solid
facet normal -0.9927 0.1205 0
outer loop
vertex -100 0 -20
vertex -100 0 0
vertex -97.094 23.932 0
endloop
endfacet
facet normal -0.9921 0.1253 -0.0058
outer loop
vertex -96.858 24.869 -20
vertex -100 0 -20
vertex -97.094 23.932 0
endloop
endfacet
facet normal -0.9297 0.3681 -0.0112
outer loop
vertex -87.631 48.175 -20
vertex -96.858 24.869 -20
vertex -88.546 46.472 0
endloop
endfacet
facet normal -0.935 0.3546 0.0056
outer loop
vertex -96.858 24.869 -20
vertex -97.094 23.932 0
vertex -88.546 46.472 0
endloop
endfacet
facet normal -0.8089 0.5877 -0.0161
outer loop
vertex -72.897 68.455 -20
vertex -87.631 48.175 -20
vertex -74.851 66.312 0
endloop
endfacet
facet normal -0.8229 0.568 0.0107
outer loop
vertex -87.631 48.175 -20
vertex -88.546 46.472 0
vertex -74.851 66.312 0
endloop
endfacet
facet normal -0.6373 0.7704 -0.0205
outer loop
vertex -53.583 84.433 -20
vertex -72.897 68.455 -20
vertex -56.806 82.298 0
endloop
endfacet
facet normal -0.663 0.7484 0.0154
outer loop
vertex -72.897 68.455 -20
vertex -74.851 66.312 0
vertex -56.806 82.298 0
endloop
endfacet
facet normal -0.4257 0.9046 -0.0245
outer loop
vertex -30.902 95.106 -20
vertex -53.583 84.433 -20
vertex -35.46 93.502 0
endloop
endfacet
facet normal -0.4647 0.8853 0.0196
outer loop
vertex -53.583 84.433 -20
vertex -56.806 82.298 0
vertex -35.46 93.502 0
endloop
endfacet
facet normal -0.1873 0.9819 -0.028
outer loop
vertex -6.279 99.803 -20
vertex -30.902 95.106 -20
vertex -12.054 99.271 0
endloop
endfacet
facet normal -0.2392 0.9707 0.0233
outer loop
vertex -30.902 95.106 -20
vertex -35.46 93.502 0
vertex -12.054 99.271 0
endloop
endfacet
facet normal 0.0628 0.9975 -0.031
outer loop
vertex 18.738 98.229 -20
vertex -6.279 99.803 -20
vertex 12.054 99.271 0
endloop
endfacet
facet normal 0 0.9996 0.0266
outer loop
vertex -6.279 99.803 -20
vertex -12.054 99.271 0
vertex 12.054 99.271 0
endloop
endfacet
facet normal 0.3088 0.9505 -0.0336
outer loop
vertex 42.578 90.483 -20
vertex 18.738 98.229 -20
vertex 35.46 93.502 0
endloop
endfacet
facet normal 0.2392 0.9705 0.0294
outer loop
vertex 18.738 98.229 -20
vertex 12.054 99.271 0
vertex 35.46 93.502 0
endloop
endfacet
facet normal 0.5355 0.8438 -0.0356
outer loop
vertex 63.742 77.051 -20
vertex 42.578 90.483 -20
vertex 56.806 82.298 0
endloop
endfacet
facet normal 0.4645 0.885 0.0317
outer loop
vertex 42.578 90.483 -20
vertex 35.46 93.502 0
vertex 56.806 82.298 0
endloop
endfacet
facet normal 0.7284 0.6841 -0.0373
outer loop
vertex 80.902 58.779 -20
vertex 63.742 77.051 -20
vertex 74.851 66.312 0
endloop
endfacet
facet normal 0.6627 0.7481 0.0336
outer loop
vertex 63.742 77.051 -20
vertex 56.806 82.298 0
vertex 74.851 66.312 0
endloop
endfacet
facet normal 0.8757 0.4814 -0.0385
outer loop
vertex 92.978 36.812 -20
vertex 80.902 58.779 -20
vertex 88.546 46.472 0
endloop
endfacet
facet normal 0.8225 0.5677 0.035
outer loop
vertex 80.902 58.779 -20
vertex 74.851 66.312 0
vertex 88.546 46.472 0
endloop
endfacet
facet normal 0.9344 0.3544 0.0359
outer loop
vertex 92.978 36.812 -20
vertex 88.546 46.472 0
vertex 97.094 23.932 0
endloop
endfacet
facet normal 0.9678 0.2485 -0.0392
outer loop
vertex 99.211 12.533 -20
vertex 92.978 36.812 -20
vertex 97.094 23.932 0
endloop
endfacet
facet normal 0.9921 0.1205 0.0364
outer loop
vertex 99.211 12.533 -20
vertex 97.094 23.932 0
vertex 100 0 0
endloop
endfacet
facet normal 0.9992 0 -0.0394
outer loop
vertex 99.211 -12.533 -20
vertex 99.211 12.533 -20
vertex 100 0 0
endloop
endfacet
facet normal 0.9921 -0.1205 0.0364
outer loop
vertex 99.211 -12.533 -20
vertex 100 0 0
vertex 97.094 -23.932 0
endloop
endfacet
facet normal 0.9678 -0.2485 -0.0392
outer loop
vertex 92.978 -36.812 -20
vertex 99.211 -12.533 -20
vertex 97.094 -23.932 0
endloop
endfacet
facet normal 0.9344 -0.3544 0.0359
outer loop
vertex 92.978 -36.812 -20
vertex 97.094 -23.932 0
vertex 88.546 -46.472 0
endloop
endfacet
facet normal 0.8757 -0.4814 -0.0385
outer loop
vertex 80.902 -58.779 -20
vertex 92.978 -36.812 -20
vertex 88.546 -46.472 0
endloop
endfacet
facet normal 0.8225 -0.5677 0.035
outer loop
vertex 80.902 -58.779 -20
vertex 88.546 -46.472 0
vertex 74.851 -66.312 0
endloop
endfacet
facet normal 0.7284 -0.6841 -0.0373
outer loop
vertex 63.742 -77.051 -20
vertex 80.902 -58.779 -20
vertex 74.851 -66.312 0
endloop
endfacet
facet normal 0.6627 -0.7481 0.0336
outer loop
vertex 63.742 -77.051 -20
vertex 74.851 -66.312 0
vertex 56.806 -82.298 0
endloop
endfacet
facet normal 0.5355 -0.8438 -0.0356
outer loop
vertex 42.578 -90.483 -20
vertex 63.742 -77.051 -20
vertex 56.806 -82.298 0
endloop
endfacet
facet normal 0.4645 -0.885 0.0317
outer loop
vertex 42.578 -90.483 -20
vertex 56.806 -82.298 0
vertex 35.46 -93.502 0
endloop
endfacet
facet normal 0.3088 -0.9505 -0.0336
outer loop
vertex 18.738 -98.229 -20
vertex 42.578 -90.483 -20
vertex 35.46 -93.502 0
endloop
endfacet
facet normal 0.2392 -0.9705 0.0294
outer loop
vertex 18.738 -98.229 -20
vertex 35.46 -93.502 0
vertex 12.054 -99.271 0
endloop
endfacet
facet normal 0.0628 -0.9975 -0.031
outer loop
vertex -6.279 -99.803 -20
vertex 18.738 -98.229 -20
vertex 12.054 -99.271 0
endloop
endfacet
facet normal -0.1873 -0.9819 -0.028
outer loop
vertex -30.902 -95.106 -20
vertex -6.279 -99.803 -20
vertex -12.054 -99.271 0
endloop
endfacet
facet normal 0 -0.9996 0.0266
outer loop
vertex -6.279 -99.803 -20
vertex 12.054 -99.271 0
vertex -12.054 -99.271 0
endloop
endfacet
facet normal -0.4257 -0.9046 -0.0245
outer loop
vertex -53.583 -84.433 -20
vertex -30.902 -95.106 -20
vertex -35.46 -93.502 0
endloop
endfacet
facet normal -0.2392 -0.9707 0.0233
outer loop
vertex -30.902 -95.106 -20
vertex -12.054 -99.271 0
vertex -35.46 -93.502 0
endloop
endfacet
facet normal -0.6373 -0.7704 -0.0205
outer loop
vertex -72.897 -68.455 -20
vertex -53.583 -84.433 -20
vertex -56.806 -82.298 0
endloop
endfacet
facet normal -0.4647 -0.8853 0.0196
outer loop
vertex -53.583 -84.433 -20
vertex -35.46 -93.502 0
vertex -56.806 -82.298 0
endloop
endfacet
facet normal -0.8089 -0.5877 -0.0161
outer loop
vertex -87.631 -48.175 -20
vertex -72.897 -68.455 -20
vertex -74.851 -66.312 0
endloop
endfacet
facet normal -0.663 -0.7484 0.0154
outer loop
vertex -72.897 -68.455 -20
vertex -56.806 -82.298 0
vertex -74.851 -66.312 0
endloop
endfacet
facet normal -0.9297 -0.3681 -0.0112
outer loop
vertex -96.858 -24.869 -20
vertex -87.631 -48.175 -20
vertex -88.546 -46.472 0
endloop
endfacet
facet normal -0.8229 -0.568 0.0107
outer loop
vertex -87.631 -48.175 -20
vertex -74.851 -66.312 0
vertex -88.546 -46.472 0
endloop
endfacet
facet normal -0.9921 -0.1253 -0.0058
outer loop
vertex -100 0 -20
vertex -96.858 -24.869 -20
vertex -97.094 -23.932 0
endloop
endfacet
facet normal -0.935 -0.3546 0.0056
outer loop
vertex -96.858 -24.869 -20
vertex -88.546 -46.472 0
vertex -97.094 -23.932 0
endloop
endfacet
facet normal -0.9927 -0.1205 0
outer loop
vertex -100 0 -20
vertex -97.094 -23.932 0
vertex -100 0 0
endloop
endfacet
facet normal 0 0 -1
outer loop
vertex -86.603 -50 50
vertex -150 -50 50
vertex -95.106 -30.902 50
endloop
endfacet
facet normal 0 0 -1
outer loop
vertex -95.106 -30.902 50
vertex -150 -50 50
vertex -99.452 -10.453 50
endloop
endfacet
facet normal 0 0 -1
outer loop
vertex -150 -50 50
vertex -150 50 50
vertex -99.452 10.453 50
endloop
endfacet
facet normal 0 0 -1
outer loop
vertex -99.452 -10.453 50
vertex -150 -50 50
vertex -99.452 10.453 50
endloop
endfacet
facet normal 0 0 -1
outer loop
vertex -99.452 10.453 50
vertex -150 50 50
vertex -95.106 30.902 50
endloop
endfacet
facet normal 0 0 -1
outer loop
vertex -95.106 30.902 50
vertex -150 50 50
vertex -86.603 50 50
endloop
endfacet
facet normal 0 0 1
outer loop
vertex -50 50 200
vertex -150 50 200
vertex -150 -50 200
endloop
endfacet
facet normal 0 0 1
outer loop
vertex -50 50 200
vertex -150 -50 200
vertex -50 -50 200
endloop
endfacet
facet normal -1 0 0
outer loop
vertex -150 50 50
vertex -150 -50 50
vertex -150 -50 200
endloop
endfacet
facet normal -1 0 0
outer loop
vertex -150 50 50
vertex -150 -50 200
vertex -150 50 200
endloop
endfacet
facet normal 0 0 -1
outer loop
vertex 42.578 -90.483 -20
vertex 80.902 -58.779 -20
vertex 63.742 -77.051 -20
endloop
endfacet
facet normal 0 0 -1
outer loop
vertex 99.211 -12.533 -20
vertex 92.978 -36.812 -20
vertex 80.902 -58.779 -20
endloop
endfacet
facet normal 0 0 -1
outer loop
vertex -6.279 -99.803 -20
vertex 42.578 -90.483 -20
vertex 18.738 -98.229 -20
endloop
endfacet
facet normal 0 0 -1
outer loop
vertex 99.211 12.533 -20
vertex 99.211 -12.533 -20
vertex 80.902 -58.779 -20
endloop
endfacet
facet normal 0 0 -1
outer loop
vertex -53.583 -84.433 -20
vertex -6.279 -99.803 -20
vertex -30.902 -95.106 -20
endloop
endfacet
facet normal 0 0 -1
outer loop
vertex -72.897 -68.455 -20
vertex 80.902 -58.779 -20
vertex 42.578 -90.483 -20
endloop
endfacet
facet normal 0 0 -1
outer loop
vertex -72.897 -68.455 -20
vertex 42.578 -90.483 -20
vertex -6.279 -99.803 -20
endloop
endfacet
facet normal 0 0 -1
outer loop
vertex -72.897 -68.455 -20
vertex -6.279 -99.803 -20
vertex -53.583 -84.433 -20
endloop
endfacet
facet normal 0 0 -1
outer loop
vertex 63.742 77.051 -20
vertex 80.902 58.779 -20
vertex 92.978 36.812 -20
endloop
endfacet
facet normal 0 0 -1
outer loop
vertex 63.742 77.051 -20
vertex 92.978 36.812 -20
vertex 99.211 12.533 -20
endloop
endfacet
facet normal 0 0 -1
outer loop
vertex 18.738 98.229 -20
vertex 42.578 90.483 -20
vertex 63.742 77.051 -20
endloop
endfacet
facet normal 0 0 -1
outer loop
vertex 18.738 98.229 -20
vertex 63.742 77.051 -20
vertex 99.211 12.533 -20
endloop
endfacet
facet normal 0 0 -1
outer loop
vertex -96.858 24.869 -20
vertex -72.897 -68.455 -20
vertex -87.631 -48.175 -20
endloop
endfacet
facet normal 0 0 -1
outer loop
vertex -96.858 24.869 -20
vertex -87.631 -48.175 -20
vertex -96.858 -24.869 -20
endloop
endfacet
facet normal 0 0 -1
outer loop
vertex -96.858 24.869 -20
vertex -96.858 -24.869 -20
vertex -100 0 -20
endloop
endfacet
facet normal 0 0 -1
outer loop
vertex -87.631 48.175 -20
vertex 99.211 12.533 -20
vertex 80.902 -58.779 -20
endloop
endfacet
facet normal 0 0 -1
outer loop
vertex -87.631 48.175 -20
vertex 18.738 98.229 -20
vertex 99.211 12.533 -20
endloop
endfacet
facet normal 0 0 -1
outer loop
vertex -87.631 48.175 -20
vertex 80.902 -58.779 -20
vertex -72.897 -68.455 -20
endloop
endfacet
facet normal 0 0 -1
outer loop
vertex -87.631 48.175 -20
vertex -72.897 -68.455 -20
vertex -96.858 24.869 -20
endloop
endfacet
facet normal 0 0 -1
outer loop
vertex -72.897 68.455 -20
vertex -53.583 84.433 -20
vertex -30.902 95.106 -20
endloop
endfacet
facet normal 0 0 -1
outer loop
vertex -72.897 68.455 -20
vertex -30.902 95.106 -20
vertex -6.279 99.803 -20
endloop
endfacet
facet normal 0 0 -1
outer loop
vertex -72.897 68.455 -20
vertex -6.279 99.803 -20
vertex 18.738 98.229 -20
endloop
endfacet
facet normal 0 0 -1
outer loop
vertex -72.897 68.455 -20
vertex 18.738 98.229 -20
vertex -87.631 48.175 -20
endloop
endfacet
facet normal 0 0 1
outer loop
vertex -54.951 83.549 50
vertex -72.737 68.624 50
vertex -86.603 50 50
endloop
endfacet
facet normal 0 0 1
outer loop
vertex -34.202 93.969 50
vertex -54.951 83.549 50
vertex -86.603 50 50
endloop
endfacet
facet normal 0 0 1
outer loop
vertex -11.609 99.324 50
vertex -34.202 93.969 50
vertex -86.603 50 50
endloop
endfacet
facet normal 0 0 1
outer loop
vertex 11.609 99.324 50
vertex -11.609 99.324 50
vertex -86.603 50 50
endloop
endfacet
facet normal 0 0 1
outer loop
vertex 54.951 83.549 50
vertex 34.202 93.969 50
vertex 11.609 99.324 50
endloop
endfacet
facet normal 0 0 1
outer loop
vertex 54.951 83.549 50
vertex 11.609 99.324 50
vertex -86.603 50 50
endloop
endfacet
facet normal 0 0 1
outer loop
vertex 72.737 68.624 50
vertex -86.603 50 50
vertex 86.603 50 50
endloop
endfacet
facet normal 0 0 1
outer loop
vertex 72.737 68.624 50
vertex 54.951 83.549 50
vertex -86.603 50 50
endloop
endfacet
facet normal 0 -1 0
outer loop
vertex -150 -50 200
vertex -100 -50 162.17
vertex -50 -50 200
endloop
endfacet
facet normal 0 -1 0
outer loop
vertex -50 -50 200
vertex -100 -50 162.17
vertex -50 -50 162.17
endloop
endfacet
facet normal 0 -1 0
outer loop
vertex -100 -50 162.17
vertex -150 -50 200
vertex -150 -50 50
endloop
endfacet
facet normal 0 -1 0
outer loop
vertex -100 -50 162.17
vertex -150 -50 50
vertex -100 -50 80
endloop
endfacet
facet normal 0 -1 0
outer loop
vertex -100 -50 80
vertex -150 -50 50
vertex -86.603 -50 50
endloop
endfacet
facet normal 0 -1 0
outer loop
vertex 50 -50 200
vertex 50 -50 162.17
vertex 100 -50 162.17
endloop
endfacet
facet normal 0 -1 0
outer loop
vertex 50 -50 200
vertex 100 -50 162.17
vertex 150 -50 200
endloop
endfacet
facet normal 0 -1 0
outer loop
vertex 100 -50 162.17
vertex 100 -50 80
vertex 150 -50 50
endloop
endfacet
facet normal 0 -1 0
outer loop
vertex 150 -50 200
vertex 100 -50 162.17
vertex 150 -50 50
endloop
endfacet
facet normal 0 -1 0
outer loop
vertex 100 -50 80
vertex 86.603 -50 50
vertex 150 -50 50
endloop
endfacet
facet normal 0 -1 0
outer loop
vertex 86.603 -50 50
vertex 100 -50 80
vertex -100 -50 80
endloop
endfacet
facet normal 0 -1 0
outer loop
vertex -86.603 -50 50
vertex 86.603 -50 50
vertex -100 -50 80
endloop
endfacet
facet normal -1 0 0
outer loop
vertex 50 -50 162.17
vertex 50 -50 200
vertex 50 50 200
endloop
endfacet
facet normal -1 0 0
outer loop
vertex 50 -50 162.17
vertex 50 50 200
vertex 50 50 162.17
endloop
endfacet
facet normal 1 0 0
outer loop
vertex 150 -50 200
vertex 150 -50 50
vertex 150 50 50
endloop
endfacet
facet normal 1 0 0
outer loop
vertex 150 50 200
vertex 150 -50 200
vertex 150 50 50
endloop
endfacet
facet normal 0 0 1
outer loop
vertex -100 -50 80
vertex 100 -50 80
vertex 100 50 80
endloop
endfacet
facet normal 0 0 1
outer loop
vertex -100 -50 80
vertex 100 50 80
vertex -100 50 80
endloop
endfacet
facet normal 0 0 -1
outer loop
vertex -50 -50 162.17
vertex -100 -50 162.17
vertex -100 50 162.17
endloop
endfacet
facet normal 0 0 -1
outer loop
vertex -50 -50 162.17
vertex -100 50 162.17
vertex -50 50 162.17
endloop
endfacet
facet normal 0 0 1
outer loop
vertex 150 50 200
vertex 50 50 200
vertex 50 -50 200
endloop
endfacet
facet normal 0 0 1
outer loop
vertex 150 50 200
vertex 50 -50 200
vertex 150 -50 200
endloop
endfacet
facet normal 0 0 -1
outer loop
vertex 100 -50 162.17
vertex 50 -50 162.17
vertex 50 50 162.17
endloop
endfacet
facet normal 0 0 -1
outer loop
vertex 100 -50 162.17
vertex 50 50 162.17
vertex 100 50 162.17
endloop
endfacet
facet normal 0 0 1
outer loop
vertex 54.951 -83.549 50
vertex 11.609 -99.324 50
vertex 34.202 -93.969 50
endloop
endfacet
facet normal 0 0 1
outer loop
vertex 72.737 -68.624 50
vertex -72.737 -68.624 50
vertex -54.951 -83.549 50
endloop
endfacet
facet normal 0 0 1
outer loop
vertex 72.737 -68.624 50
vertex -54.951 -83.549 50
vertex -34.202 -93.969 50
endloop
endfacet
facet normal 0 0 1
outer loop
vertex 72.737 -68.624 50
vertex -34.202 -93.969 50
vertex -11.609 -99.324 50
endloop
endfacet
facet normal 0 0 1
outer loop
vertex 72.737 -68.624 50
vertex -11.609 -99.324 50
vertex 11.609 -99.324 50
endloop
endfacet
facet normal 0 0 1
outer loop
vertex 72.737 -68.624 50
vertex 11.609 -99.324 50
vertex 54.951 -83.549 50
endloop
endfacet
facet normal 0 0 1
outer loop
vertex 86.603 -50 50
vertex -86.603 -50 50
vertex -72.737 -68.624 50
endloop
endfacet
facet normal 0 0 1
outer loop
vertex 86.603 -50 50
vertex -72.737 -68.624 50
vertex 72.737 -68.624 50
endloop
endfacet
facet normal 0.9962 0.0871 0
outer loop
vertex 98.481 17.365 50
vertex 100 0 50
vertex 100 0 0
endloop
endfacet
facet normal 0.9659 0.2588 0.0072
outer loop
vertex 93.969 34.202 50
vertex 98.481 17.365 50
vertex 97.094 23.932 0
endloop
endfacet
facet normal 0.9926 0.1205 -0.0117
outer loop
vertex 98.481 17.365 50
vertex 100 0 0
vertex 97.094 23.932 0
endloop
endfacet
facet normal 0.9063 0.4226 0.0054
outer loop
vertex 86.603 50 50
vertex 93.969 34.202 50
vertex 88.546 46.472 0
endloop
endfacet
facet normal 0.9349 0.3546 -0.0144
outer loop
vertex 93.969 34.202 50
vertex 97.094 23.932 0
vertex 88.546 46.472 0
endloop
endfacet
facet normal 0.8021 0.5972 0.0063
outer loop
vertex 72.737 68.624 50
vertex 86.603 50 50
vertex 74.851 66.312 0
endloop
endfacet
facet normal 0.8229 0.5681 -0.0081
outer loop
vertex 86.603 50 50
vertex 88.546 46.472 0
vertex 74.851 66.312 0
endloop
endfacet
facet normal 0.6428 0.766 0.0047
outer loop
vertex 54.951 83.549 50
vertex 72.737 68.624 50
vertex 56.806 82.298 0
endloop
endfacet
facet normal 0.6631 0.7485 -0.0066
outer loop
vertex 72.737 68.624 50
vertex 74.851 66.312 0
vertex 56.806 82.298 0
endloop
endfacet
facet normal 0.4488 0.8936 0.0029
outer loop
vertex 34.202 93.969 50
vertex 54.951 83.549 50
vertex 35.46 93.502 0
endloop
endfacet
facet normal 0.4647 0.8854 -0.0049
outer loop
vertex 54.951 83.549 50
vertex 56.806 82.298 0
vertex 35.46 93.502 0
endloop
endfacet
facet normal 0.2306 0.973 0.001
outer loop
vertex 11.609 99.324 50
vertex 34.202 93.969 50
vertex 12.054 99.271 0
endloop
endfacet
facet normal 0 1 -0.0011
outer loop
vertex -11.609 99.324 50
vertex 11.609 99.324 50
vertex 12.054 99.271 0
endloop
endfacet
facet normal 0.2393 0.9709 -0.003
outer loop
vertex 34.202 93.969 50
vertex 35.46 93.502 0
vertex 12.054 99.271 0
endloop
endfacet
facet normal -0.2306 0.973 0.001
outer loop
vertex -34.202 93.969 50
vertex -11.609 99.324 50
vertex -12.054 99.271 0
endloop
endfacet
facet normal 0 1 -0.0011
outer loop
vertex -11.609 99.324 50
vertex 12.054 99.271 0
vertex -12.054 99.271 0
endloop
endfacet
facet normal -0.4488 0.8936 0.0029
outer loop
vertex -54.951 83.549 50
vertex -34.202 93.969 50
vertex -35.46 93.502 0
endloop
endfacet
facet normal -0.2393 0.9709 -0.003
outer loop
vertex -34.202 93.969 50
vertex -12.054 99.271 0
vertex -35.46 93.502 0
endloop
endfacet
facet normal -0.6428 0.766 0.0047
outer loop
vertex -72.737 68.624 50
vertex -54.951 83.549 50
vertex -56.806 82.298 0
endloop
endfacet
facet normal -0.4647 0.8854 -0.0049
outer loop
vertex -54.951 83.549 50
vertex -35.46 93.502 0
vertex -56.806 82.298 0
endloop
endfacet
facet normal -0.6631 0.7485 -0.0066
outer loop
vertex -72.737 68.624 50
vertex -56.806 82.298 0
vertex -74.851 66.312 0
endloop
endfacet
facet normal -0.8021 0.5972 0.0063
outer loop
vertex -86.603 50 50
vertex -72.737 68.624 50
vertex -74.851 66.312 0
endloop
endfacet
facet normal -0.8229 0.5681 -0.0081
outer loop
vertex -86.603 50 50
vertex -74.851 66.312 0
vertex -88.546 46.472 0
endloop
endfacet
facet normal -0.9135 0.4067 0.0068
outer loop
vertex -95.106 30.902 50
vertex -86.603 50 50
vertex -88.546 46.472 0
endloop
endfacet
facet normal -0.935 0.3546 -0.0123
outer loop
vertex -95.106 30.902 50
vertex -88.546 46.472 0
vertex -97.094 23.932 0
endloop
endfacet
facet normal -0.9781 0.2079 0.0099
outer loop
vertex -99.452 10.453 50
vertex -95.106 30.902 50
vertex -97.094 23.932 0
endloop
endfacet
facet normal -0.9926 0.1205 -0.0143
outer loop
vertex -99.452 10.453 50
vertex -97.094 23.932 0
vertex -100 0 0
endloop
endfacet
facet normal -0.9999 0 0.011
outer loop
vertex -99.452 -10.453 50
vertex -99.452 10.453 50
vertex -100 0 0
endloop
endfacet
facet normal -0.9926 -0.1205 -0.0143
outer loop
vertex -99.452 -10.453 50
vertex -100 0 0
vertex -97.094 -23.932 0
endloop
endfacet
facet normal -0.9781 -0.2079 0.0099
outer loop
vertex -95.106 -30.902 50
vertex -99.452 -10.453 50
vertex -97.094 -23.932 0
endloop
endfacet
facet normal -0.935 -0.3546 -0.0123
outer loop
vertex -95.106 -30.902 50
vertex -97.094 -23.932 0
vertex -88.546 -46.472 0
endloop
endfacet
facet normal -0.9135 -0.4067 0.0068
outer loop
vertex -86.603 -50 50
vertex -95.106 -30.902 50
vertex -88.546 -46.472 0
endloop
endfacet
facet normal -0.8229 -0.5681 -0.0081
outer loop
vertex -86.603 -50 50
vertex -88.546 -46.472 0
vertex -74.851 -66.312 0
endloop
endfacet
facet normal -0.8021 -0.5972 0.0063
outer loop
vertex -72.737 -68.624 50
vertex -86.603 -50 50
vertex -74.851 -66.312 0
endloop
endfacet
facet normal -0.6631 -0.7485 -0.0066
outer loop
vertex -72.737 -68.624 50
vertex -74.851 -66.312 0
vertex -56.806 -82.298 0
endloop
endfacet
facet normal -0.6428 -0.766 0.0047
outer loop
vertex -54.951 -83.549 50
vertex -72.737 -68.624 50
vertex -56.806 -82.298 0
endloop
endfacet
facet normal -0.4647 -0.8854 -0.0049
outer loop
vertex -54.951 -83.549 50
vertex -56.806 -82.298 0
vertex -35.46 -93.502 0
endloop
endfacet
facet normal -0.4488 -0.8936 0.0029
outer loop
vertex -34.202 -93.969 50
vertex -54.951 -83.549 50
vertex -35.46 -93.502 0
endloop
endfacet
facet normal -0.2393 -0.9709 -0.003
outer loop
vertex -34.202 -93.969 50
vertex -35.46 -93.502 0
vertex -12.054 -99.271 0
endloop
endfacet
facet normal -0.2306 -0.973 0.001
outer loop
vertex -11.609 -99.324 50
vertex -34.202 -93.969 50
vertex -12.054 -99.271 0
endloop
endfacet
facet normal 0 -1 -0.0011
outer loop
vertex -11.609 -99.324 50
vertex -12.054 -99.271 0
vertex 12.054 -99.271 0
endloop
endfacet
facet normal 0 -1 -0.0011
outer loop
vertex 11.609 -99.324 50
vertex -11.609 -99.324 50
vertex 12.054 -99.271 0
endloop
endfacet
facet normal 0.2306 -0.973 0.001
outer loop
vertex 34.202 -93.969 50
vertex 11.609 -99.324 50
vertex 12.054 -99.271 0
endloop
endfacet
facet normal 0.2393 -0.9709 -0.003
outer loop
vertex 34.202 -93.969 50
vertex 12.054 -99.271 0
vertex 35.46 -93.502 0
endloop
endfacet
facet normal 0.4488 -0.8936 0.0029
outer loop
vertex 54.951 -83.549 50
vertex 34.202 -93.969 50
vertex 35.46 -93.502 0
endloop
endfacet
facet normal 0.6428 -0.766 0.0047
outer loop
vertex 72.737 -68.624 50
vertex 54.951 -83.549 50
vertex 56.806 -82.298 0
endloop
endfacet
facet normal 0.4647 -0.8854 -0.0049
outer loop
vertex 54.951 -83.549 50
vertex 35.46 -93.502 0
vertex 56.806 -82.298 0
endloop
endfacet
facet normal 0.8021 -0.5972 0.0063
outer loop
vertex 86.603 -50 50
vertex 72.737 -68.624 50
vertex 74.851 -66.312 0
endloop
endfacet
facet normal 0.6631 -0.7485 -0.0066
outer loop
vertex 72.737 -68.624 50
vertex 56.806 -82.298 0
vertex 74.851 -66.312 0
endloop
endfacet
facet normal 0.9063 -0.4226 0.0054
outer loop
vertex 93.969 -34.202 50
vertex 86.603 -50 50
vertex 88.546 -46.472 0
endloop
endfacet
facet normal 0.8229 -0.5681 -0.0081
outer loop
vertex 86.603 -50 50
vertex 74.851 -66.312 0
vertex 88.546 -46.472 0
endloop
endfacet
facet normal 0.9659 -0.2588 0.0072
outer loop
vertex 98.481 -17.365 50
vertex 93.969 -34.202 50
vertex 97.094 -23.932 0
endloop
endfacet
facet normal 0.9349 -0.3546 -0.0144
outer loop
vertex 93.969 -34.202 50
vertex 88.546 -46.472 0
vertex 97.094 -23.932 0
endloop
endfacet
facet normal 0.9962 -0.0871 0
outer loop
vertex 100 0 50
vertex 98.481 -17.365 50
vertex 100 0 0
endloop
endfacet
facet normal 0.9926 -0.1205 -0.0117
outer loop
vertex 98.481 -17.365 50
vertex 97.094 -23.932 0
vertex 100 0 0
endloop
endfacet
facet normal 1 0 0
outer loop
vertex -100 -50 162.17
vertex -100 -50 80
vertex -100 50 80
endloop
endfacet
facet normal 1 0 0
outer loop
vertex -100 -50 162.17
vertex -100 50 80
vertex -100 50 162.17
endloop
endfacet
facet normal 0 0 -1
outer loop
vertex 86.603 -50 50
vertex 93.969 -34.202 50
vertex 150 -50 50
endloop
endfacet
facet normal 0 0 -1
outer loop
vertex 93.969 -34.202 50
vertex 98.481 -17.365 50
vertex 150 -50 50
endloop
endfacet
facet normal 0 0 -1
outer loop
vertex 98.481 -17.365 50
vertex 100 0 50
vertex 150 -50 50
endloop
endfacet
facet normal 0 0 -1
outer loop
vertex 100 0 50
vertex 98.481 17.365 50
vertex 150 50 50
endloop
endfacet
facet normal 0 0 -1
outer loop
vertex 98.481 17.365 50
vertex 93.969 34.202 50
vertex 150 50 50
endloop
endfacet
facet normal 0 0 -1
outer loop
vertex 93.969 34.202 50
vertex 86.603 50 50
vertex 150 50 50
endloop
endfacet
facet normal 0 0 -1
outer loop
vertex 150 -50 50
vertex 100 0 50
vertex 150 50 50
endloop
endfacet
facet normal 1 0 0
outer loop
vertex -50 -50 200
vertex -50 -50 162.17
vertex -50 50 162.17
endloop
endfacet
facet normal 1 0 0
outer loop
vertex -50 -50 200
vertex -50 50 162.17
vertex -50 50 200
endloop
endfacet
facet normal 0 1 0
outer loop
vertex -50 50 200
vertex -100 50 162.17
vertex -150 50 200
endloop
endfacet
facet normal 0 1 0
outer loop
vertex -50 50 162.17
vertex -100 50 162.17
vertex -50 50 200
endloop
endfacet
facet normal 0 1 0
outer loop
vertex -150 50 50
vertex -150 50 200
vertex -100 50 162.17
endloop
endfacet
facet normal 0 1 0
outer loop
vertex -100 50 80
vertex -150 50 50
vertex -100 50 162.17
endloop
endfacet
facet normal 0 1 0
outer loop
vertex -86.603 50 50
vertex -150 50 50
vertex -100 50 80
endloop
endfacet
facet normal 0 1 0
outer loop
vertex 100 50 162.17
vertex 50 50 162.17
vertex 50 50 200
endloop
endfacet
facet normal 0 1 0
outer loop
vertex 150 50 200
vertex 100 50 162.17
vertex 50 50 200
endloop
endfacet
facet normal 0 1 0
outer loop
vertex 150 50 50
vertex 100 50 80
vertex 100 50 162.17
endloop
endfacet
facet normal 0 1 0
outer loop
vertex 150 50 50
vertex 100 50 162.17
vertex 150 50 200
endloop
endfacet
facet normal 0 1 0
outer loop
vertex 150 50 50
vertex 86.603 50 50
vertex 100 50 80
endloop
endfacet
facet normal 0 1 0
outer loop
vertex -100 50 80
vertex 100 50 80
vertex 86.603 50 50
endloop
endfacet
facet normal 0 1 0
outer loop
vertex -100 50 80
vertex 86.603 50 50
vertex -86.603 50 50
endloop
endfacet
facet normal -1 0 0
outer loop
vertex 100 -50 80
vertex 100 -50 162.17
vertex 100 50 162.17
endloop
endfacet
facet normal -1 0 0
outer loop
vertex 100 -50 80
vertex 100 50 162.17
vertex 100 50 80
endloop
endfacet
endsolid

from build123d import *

# Parameters (mm, degrees)
CROQUIS1_R              = 100
SALIENTE_EXTRUIR1_DEPTH = 50
CROQUIS2_W              = 300
CROQUIS2_H              = 100
SALIENTE_EXTRUIR2_DEPTH = 150
CORTAR_EXTRUIR1_DEPTH   = 150
CROQUIS6_R              = 100
SALIENTE_EXTRUIR3_DEPTH = 20


with BuildPart() as part:
    # Croquis1 → Saliente-Extruir1 (new body)
    with BuildSketch(Plane.XY):
        Circle(CROQUIS1_R)
    extrude(amount=SALIENTE_EXTRUIR1_DEPTH)

    # Croquis2 → Saliente-Extruir2 (add)
    with BuildSketch(Plane.XY.offset(50)):
        Rectangle(CROQUIS2_W, CROQUIS2_H)
    extrude(amount=SALIENTE_EXTRUIR2_DEPTH)

    # Croquis3 → Cortar-Extruir1 (cut)
    with BuildSketch(Plane.XZ.offset(50)):
        Polygon((-100, 162.170416567), (-50, 162.170416567), (-50, 200), (50, 200), (50, 162.170416567), (100, 162.170416567), (100, 80), (-100, 80), align=None)
    extrude(amount=-CORTAR_EXTRUIR1_DEPTH, mode=Mode.SUBTRACT)

    # Croquis6 → Saliente-Extruir3 (add)
    with BuildSketch(Plane(origin=(0, 0, 0), x_dir=(-1, 0, 0), z_dir=(0, 0, -1))):
        Circle(CROQUIS6_R)
    extrude(amount=SALIENTE_EXTRUIR3_DEPTH)


solid = part.part
